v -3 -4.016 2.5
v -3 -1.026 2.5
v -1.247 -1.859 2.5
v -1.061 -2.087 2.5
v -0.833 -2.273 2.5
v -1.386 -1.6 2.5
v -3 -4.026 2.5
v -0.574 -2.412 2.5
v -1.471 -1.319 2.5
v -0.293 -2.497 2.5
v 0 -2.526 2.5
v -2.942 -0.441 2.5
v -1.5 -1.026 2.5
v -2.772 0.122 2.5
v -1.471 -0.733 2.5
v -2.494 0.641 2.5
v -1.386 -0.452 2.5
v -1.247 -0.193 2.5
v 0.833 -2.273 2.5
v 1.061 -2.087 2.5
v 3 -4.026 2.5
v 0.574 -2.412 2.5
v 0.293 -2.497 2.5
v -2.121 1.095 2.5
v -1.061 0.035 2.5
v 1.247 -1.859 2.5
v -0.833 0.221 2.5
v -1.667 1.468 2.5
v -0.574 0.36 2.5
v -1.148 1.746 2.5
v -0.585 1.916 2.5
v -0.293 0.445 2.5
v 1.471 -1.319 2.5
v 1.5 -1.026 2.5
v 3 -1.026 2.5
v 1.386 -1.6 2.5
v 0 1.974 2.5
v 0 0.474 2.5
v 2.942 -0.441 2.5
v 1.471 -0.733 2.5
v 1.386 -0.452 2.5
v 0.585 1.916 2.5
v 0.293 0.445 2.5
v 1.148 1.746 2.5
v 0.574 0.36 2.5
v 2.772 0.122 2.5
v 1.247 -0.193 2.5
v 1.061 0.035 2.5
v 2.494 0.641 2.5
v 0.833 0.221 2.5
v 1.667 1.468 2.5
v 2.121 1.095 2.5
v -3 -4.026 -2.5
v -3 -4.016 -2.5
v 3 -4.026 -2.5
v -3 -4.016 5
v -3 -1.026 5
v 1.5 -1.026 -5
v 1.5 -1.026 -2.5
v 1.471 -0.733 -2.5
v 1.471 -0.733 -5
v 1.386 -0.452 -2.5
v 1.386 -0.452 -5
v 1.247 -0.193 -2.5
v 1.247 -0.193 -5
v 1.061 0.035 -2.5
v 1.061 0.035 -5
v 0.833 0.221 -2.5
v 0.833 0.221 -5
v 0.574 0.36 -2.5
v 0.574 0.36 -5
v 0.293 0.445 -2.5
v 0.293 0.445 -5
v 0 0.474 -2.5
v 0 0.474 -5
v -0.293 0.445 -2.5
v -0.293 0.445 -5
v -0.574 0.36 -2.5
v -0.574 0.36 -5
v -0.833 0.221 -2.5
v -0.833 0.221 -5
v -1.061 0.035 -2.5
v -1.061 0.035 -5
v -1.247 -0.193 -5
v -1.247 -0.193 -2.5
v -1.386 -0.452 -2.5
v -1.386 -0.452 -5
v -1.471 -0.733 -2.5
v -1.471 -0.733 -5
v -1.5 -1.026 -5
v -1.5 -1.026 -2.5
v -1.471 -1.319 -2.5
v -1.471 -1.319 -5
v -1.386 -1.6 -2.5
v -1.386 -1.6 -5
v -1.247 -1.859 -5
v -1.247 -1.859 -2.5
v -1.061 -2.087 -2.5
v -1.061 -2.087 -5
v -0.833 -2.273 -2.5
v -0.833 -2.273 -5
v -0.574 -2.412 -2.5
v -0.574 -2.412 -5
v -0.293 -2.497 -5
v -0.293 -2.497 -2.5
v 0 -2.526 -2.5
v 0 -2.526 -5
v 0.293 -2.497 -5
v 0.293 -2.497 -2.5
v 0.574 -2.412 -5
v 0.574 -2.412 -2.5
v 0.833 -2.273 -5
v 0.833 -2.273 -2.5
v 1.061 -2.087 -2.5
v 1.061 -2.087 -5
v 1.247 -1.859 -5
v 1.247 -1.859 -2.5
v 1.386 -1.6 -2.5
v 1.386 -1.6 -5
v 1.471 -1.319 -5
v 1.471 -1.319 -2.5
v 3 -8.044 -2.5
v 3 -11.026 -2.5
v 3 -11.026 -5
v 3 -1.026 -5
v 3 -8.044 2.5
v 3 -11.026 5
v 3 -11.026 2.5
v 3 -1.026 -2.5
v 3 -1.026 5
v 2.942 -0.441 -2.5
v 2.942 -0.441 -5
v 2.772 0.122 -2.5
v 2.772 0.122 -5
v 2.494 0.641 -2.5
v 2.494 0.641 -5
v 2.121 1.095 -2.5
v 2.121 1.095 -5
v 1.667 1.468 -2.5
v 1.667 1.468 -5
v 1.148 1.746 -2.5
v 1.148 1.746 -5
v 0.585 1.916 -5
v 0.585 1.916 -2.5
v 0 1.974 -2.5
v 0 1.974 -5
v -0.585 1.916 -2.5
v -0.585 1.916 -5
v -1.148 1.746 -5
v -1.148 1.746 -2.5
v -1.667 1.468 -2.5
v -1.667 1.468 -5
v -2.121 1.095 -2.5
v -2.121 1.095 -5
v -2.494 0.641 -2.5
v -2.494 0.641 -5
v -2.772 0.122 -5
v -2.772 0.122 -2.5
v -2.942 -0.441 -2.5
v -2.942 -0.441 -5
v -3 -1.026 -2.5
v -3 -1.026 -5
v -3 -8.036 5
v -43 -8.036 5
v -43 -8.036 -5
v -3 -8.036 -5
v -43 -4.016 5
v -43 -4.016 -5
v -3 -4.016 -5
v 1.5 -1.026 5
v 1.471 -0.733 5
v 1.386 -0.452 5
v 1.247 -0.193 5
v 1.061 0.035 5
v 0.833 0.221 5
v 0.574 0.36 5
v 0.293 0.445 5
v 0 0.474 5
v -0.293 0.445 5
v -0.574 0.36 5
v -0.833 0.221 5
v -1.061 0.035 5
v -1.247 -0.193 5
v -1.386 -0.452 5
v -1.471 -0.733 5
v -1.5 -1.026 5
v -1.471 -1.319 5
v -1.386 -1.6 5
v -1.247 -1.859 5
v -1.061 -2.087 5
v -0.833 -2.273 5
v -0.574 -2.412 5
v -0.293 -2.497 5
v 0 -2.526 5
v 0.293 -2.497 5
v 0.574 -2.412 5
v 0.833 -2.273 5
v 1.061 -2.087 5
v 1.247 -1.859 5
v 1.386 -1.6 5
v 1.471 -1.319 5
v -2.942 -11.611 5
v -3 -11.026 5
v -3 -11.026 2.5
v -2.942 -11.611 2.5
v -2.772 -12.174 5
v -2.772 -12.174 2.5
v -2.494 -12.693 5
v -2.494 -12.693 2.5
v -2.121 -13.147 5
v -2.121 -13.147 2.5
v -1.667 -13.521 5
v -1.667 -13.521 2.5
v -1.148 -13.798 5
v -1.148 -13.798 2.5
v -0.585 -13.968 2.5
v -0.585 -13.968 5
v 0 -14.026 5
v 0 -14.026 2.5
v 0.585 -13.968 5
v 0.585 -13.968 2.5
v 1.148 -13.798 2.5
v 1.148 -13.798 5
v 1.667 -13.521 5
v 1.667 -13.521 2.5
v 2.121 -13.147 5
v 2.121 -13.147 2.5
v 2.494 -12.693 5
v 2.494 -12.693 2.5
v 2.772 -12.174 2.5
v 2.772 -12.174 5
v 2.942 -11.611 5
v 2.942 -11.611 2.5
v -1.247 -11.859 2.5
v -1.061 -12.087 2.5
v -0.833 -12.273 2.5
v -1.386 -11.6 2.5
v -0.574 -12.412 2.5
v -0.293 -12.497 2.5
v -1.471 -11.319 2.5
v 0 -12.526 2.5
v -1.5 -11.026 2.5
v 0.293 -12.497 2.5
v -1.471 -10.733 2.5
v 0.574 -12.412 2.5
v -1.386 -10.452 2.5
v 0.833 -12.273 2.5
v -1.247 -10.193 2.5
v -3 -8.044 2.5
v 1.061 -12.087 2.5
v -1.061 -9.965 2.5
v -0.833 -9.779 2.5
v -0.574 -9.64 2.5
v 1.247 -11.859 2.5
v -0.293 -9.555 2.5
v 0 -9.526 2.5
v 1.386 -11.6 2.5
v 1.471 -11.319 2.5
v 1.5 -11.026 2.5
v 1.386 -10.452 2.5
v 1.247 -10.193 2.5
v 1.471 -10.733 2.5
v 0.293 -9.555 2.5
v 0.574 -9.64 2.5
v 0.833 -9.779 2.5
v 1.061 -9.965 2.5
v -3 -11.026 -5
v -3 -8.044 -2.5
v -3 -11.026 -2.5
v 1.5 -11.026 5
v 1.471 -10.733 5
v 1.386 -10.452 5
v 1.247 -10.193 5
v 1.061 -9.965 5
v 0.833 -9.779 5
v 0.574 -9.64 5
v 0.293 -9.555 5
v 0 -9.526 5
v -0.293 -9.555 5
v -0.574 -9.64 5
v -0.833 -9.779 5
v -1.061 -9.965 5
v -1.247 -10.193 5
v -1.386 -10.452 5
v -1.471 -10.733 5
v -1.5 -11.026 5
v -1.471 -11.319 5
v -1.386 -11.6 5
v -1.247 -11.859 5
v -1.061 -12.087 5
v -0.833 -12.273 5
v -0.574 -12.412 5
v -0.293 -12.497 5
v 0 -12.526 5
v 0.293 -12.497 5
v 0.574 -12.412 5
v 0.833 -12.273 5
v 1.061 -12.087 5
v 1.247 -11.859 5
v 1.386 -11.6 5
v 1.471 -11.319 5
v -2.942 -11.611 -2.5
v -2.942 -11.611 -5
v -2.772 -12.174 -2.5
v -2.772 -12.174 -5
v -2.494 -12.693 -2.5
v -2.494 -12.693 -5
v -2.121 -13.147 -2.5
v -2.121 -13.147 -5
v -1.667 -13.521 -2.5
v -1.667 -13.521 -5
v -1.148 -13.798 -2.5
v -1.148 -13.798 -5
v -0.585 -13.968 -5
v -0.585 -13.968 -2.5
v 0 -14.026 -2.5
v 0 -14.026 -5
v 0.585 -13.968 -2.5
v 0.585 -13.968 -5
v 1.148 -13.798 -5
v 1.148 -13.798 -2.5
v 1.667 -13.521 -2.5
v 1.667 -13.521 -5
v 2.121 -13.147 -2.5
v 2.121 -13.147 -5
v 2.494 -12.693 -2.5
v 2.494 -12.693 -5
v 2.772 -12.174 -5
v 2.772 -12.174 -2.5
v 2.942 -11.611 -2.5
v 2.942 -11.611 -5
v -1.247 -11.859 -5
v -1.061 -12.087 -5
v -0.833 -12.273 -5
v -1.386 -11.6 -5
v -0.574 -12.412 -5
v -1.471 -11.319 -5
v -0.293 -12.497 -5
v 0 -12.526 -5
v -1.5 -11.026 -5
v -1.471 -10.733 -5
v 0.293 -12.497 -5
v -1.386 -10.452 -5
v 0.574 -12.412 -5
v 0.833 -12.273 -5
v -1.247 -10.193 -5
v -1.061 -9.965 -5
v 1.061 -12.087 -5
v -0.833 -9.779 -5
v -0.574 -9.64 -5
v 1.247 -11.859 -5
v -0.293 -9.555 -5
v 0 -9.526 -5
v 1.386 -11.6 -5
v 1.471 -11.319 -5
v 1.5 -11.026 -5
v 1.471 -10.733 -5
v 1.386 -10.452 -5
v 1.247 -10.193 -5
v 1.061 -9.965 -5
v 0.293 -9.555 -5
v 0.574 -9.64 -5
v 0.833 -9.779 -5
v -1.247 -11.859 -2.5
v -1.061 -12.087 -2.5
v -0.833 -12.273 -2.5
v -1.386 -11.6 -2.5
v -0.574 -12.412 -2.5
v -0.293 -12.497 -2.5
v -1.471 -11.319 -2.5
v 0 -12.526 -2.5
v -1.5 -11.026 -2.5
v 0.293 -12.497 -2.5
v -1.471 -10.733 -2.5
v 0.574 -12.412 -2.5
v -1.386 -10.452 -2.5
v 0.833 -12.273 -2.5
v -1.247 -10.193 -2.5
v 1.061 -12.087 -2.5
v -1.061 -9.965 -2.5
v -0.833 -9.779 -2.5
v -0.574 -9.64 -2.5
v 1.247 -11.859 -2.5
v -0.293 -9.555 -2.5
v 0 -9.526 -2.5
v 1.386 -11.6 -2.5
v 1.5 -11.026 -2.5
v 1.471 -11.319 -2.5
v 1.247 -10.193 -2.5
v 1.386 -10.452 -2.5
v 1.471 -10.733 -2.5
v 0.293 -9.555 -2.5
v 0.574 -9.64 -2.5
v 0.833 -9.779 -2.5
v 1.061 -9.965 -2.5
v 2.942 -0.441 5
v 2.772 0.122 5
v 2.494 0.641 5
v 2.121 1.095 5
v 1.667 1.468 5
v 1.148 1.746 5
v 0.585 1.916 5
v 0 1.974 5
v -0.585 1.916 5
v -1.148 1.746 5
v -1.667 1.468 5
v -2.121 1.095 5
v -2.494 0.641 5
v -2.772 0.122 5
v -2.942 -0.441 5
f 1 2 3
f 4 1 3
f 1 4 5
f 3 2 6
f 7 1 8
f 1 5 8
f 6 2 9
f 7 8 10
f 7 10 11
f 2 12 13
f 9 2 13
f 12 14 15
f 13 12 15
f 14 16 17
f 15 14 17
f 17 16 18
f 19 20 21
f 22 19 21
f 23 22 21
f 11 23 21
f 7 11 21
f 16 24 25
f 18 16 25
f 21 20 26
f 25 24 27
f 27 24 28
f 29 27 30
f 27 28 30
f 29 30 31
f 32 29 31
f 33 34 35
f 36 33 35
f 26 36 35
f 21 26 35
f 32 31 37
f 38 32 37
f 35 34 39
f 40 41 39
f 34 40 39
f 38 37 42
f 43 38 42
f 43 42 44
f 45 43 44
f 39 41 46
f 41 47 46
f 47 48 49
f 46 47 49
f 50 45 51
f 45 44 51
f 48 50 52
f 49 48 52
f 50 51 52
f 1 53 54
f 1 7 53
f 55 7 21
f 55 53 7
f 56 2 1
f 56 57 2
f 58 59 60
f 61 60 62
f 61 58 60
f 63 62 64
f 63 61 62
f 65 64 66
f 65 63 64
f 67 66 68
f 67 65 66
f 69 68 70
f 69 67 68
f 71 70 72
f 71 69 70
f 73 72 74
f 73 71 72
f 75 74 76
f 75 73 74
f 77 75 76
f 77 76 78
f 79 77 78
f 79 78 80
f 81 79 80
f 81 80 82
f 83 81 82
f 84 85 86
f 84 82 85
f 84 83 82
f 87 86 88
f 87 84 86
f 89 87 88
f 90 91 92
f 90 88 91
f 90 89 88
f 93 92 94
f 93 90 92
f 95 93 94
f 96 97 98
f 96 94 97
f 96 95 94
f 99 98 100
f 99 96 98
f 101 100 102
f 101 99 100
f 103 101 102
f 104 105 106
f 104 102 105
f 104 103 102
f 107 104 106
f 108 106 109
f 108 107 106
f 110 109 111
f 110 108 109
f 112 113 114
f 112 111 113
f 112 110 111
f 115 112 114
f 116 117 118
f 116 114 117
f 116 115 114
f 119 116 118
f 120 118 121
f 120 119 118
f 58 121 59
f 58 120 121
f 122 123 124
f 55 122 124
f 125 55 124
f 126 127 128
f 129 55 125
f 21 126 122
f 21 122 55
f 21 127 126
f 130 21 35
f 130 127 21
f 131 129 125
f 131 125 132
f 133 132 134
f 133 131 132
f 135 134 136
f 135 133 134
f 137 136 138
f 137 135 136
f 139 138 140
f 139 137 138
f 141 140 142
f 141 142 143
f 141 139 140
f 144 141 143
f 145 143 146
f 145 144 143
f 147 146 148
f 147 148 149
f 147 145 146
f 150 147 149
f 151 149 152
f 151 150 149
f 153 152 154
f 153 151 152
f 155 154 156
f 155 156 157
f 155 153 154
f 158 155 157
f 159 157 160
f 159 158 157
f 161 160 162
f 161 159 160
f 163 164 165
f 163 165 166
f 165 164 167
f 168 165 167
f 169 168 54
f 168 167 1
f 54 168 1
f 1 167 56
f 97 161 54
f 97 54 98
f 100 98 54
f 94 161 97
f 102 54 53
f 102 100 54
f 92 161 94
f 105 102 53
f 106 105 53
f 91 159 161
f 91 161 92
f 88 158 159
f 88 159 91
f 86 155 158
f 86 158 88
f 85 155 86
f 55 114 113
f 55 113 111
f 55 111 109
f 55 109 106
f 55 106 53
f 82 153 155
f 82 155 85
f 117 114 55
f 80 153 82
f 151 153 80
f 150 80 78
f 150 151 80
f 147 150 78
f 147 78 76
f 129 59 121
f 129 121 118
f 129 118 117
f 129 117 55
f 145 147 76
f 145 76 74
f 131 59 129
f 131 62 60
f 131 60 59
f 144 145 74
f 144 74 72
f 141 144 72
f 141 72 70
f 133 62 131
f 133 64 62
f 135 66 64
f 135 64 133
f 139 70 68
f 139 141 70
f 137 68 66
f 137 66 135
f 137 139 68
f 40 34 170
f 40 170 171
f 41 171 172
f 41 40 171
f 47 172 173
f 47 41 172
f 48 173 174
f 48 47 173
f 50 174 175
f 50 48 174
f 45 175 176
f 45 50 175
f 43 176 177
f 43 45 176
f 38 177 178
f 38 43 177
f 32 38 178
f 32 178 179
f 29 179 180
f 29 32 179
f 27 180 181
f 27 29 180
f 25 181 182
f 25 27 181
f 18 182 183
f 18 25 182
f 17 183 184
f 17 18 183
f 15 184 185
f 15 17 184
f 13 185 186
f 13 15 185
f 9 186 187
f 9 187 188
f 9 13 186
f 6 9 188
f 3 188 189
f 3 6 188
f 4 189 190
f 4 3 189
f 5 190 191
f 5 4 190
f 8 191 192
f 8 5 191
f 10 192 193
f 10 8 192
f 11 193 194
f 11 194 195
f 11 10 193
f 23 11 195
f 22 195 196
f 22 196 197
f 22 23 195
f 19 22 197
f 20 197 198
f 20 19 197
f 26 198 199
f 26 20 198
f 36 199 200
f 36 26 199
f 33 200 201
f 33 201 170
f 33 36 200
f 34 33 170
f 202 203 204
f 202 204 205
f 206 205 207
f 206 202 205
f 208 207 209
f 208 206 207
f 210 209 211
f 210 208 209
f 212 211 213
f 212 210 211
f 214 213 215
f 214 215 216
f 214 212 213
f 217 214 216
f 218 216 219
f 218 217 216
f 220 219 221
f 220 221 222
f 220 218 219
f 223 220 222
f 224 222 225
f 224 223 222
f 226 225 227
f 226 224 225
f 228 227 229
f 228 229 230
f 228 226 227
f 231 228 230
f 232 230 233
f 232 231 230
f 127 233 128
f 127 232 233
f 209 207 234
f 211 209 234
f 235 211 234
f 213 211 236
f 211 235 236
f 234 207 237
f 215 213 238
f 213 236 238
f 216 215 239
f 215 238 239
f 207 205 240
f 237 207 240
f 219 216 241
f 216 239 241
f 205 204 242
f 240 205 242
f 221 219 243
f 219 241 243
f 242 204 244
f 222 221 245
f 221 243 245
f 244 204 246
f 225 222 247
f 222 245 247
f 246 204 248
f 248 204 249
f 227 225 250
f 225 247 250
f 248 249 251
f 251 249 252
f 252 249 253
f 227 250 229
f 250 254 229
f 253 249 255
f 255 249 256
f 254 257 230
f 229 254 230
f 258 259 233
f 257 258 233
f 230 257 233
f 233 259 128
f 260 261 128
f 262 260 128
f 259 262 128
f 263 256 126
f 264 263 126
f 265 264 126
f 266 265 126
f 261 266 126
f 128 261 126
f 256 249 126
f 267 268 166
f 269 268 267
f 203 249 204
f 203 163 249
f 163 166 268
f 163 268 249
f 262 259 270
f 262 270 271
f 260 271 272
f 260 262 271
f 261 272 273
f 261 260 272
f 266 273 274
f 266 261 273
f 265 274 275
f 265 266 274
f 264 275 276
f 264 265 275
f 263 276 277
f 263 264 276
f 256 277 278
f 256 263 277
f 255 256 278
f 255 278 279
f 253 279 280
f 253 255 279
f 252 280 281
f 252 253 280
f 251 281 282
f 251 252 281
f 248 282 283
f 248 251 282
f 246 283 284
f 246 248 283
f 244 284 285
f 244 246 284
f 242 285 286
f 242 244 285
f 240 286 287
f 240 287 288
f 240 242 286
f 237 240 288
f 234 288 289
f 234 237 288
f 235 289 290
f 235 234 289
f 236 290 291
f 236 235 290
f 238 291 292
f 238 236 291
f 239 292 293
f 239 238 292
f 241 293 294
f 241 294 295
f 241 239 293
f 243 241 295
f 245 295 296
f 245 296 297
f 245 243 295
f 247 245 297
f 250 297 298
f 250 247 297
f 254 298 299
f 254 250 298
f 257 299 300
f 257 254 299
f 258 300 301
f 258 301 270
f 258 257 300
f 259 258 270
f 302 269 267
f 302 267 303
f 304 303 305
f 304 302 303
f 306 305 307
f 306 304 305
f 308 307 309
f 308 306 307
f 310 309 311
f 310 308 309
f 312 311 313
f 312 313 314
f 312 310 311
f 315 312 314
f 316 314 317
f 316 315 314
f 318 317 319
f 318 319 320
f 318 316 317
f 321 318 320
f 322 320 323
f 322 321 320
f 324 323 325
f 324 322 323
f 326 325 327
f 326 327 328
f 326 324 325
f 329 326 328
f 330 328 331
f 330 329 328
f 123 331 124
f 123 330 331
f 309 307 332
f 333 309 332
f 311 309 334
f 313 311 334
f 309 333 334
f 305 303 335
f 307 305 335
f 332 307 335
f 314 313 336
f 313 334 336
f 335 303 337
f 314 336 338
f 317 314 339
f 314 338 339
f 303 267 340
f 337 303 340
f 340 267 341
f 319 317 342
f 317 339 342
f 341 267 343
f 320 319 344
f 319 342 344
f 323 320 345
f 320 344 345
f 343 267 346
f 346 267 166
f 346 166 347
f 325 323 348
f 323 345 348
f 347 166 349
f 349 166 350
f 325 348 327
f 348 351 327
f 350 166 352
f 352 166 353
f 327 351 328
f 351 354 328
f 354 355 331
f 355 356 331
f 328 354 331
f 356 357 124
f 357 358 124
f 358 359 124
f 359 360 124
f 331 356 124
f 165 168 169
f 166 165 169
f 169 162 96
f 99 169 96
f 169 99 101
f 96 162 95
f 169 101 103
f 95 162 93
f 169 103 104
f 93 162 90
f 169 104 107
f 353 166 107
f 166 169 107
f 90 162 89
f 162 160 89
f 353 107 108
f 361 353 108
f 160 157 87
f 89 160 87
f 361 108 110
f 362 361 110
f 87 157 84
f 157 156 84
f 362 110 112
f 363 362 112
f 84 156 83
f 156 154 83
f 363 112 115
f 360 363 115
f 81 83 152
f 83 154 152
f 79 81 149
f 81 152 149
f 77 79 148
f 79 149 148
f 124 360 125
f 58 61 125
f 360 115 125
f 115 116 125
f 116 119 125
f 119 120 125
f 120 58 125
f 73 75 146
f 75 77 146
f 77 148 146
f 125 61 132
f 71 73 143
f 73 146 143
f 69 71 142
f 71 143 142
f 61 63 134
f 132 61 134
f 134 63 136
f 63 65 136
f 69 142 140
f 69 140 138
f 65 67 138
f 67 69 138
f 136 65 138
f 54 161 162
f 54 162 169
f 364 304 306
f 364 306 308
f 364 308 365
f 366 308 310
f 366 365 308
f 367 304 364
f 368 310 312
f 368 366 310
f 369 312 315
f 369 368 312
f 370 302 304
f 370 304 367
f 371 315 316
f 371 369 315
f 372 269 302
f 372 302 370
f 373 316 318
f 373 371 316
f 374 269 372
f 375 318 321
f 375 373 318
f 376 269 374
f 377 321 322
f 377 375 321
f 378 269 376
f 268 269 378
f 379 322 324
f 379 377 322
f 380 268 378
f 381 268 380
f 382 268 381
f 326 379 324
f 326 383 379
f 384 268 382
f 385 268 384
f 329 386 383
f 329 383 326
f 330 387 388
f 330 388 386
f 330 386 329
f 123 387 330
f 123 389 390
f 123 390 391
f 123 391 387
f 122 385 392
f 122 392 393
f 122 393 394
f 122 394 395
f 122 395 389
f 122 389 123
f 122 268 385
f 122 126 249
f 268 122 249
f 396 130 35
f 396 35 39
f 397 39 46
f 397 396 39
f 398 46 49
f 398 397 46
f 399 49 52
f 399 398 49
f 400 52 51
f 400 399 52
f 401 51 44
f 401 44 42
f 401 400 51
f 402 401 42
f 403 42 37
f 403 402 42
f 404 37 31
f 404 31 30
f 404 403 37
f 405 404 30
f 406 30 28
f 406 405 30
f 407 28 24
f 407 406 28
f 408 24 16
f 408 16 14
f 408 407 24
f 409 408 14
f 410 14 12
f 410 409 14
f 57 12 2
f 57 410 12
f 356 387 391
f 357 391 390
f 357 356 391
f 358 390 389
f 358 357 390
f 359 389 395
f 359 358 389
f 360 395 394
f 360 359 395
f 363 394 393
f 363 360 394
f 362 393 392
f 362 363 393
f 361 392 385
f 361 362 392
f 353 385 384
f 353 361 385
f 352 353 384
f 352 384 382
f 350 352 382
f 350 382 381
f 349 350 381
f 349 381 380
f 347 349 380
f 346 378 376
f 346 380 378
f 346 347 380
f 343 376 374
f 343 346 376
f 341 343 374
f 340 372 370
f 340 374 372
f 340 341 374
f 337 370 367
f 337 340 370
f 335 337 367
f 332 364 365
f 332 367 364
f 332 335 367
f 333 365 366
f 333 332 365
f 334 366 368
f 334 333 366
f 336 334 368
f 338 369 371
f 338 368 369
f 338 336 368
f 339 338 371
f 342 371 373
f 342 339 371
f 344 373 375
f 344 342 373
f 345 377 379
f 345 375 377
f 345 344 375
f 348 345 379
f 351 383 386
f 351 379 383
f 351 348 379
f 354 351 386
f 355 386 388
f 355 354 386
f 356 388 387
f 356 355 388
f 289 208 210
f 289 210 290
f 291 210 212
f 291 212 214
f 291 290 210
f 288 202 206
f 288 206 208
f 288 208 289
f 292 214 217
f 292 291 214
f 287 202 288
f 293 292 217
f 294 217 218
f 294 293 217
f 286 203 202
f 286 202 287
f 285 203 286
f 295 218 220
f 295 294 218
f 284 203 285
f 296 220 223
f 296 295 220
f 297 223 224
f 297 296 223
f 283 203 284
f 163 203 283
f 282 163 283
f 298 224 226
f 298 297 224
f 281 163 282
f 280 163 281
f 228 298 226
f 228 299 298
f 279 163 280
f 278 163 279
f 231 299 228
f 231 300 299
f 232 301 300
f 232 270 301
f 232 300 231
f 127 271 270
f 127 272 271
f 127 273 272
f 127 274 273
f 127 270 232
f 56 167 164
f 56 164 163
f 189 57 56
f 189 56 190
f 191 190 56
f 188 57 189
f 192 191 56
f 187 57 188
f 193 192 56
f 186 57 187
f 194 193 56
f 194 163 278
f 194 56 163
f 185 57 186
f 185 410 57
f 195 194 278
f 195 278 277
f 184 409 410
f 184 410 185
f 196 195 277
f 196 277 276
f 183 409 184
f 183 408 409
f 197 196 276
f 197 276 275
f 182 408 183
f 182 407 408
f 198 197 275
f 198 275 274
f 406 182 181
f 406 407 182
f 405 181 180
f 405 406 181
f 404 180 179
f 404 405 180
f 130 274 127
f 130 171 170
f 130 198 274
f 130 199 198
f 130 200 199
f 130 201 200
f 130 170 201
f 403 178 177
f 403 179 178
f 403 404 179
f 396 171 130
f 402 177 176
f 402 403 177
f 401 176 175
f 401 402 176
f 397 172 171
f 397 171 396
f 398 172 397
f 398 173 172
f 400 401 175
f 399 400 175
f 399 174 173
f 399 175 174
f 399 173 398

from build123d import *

# Parameters (mm, degrees)
IZIM1_R                     = 1.5
Y_KSEKLIK_EKSTR_ZYON1_DEPTH = 5
KES_EKSTR_ZYON1_DEPTH       = 2.5
IZIM3_W                     = 40
IZIM3_H                     = 4.02
Y_KSEKLIK_EKSTR_ZYON7_DEPTH = 5


with BuildPart() as part:
    # Çizim1 → Yükseklik-Ekstrüzyon1 (new, symmetric)
    with BuildSketch(Plane.XY):
        with BuildLine():
            Line((-3, -1.02611879), (-3, -11.02611879))
            ThreePointArc((-3, -11.02611879), (0, -14.02611879), (3, -11.02611879))
            Line((3, -11.02611879), (3, -1.02611879))
            ThreePointArc((3, -1.02611879), (0, 1.97388121), (-3, -1.02611879))
        make_face()
        with Locations((0, -1.02611879)):
            Circle(IZIM1_R, mode=Mode.SUBTRACT)
        with Locations((0, -11.02611879)):
            Circle(IZIM1_R, mode=Mode.SUBTRACT)
    extrude(amount=Y_KSEKLIK_EKSTR_ZYON1_DEPTH, both=True)

    # Çizim2 → Kes-Ekstrüzyon1 (cut, symmetric)
    with BuildSketch(Plane.XY):
        with BuildLine():
            Line((-3, -1.02611879), (-3, -4.02611879))
            Line((-3, -4.02611879), (0, -4.02611879))
            Line((0, -4.02611879), (3, -4.02611879))
            Line((3, -4.02611879), (3, -1.02611879))
            ThreePointArc((3, -1.02611879), (0, 1.97388121), (-3, -1.02611879))
        make_face()
        with BuildLine():
            ThreePointArc((-3, -11.02611879), (0, -14.02611879), (3, -11.02611879))
            Line((3, -11.02611879), (3, -8.043702706))
            Line((3, -8.043702706), (-3, -8.043702706))
            Line((-3, -8.043702706), (-3, -11.02611879))
        make_face()
    extrude(amount=KES_EKSTR_ZYON1_DEPTH, both=True, mode=Mode.SUBTRACT)

    # Çizim3 → Yükseklik-Ekstrüzyon7 (add, symmetric)
    with BuildSketch(Plane.XY):
        with Locations((-23, -6.02611879)):
            Rectangle(IZIM3_W, IZIM3_H)
    extrude(amount=Y_KSEKLIK_EKSTR_ZYON7_DEPTH, both=True)


solid = part.part
